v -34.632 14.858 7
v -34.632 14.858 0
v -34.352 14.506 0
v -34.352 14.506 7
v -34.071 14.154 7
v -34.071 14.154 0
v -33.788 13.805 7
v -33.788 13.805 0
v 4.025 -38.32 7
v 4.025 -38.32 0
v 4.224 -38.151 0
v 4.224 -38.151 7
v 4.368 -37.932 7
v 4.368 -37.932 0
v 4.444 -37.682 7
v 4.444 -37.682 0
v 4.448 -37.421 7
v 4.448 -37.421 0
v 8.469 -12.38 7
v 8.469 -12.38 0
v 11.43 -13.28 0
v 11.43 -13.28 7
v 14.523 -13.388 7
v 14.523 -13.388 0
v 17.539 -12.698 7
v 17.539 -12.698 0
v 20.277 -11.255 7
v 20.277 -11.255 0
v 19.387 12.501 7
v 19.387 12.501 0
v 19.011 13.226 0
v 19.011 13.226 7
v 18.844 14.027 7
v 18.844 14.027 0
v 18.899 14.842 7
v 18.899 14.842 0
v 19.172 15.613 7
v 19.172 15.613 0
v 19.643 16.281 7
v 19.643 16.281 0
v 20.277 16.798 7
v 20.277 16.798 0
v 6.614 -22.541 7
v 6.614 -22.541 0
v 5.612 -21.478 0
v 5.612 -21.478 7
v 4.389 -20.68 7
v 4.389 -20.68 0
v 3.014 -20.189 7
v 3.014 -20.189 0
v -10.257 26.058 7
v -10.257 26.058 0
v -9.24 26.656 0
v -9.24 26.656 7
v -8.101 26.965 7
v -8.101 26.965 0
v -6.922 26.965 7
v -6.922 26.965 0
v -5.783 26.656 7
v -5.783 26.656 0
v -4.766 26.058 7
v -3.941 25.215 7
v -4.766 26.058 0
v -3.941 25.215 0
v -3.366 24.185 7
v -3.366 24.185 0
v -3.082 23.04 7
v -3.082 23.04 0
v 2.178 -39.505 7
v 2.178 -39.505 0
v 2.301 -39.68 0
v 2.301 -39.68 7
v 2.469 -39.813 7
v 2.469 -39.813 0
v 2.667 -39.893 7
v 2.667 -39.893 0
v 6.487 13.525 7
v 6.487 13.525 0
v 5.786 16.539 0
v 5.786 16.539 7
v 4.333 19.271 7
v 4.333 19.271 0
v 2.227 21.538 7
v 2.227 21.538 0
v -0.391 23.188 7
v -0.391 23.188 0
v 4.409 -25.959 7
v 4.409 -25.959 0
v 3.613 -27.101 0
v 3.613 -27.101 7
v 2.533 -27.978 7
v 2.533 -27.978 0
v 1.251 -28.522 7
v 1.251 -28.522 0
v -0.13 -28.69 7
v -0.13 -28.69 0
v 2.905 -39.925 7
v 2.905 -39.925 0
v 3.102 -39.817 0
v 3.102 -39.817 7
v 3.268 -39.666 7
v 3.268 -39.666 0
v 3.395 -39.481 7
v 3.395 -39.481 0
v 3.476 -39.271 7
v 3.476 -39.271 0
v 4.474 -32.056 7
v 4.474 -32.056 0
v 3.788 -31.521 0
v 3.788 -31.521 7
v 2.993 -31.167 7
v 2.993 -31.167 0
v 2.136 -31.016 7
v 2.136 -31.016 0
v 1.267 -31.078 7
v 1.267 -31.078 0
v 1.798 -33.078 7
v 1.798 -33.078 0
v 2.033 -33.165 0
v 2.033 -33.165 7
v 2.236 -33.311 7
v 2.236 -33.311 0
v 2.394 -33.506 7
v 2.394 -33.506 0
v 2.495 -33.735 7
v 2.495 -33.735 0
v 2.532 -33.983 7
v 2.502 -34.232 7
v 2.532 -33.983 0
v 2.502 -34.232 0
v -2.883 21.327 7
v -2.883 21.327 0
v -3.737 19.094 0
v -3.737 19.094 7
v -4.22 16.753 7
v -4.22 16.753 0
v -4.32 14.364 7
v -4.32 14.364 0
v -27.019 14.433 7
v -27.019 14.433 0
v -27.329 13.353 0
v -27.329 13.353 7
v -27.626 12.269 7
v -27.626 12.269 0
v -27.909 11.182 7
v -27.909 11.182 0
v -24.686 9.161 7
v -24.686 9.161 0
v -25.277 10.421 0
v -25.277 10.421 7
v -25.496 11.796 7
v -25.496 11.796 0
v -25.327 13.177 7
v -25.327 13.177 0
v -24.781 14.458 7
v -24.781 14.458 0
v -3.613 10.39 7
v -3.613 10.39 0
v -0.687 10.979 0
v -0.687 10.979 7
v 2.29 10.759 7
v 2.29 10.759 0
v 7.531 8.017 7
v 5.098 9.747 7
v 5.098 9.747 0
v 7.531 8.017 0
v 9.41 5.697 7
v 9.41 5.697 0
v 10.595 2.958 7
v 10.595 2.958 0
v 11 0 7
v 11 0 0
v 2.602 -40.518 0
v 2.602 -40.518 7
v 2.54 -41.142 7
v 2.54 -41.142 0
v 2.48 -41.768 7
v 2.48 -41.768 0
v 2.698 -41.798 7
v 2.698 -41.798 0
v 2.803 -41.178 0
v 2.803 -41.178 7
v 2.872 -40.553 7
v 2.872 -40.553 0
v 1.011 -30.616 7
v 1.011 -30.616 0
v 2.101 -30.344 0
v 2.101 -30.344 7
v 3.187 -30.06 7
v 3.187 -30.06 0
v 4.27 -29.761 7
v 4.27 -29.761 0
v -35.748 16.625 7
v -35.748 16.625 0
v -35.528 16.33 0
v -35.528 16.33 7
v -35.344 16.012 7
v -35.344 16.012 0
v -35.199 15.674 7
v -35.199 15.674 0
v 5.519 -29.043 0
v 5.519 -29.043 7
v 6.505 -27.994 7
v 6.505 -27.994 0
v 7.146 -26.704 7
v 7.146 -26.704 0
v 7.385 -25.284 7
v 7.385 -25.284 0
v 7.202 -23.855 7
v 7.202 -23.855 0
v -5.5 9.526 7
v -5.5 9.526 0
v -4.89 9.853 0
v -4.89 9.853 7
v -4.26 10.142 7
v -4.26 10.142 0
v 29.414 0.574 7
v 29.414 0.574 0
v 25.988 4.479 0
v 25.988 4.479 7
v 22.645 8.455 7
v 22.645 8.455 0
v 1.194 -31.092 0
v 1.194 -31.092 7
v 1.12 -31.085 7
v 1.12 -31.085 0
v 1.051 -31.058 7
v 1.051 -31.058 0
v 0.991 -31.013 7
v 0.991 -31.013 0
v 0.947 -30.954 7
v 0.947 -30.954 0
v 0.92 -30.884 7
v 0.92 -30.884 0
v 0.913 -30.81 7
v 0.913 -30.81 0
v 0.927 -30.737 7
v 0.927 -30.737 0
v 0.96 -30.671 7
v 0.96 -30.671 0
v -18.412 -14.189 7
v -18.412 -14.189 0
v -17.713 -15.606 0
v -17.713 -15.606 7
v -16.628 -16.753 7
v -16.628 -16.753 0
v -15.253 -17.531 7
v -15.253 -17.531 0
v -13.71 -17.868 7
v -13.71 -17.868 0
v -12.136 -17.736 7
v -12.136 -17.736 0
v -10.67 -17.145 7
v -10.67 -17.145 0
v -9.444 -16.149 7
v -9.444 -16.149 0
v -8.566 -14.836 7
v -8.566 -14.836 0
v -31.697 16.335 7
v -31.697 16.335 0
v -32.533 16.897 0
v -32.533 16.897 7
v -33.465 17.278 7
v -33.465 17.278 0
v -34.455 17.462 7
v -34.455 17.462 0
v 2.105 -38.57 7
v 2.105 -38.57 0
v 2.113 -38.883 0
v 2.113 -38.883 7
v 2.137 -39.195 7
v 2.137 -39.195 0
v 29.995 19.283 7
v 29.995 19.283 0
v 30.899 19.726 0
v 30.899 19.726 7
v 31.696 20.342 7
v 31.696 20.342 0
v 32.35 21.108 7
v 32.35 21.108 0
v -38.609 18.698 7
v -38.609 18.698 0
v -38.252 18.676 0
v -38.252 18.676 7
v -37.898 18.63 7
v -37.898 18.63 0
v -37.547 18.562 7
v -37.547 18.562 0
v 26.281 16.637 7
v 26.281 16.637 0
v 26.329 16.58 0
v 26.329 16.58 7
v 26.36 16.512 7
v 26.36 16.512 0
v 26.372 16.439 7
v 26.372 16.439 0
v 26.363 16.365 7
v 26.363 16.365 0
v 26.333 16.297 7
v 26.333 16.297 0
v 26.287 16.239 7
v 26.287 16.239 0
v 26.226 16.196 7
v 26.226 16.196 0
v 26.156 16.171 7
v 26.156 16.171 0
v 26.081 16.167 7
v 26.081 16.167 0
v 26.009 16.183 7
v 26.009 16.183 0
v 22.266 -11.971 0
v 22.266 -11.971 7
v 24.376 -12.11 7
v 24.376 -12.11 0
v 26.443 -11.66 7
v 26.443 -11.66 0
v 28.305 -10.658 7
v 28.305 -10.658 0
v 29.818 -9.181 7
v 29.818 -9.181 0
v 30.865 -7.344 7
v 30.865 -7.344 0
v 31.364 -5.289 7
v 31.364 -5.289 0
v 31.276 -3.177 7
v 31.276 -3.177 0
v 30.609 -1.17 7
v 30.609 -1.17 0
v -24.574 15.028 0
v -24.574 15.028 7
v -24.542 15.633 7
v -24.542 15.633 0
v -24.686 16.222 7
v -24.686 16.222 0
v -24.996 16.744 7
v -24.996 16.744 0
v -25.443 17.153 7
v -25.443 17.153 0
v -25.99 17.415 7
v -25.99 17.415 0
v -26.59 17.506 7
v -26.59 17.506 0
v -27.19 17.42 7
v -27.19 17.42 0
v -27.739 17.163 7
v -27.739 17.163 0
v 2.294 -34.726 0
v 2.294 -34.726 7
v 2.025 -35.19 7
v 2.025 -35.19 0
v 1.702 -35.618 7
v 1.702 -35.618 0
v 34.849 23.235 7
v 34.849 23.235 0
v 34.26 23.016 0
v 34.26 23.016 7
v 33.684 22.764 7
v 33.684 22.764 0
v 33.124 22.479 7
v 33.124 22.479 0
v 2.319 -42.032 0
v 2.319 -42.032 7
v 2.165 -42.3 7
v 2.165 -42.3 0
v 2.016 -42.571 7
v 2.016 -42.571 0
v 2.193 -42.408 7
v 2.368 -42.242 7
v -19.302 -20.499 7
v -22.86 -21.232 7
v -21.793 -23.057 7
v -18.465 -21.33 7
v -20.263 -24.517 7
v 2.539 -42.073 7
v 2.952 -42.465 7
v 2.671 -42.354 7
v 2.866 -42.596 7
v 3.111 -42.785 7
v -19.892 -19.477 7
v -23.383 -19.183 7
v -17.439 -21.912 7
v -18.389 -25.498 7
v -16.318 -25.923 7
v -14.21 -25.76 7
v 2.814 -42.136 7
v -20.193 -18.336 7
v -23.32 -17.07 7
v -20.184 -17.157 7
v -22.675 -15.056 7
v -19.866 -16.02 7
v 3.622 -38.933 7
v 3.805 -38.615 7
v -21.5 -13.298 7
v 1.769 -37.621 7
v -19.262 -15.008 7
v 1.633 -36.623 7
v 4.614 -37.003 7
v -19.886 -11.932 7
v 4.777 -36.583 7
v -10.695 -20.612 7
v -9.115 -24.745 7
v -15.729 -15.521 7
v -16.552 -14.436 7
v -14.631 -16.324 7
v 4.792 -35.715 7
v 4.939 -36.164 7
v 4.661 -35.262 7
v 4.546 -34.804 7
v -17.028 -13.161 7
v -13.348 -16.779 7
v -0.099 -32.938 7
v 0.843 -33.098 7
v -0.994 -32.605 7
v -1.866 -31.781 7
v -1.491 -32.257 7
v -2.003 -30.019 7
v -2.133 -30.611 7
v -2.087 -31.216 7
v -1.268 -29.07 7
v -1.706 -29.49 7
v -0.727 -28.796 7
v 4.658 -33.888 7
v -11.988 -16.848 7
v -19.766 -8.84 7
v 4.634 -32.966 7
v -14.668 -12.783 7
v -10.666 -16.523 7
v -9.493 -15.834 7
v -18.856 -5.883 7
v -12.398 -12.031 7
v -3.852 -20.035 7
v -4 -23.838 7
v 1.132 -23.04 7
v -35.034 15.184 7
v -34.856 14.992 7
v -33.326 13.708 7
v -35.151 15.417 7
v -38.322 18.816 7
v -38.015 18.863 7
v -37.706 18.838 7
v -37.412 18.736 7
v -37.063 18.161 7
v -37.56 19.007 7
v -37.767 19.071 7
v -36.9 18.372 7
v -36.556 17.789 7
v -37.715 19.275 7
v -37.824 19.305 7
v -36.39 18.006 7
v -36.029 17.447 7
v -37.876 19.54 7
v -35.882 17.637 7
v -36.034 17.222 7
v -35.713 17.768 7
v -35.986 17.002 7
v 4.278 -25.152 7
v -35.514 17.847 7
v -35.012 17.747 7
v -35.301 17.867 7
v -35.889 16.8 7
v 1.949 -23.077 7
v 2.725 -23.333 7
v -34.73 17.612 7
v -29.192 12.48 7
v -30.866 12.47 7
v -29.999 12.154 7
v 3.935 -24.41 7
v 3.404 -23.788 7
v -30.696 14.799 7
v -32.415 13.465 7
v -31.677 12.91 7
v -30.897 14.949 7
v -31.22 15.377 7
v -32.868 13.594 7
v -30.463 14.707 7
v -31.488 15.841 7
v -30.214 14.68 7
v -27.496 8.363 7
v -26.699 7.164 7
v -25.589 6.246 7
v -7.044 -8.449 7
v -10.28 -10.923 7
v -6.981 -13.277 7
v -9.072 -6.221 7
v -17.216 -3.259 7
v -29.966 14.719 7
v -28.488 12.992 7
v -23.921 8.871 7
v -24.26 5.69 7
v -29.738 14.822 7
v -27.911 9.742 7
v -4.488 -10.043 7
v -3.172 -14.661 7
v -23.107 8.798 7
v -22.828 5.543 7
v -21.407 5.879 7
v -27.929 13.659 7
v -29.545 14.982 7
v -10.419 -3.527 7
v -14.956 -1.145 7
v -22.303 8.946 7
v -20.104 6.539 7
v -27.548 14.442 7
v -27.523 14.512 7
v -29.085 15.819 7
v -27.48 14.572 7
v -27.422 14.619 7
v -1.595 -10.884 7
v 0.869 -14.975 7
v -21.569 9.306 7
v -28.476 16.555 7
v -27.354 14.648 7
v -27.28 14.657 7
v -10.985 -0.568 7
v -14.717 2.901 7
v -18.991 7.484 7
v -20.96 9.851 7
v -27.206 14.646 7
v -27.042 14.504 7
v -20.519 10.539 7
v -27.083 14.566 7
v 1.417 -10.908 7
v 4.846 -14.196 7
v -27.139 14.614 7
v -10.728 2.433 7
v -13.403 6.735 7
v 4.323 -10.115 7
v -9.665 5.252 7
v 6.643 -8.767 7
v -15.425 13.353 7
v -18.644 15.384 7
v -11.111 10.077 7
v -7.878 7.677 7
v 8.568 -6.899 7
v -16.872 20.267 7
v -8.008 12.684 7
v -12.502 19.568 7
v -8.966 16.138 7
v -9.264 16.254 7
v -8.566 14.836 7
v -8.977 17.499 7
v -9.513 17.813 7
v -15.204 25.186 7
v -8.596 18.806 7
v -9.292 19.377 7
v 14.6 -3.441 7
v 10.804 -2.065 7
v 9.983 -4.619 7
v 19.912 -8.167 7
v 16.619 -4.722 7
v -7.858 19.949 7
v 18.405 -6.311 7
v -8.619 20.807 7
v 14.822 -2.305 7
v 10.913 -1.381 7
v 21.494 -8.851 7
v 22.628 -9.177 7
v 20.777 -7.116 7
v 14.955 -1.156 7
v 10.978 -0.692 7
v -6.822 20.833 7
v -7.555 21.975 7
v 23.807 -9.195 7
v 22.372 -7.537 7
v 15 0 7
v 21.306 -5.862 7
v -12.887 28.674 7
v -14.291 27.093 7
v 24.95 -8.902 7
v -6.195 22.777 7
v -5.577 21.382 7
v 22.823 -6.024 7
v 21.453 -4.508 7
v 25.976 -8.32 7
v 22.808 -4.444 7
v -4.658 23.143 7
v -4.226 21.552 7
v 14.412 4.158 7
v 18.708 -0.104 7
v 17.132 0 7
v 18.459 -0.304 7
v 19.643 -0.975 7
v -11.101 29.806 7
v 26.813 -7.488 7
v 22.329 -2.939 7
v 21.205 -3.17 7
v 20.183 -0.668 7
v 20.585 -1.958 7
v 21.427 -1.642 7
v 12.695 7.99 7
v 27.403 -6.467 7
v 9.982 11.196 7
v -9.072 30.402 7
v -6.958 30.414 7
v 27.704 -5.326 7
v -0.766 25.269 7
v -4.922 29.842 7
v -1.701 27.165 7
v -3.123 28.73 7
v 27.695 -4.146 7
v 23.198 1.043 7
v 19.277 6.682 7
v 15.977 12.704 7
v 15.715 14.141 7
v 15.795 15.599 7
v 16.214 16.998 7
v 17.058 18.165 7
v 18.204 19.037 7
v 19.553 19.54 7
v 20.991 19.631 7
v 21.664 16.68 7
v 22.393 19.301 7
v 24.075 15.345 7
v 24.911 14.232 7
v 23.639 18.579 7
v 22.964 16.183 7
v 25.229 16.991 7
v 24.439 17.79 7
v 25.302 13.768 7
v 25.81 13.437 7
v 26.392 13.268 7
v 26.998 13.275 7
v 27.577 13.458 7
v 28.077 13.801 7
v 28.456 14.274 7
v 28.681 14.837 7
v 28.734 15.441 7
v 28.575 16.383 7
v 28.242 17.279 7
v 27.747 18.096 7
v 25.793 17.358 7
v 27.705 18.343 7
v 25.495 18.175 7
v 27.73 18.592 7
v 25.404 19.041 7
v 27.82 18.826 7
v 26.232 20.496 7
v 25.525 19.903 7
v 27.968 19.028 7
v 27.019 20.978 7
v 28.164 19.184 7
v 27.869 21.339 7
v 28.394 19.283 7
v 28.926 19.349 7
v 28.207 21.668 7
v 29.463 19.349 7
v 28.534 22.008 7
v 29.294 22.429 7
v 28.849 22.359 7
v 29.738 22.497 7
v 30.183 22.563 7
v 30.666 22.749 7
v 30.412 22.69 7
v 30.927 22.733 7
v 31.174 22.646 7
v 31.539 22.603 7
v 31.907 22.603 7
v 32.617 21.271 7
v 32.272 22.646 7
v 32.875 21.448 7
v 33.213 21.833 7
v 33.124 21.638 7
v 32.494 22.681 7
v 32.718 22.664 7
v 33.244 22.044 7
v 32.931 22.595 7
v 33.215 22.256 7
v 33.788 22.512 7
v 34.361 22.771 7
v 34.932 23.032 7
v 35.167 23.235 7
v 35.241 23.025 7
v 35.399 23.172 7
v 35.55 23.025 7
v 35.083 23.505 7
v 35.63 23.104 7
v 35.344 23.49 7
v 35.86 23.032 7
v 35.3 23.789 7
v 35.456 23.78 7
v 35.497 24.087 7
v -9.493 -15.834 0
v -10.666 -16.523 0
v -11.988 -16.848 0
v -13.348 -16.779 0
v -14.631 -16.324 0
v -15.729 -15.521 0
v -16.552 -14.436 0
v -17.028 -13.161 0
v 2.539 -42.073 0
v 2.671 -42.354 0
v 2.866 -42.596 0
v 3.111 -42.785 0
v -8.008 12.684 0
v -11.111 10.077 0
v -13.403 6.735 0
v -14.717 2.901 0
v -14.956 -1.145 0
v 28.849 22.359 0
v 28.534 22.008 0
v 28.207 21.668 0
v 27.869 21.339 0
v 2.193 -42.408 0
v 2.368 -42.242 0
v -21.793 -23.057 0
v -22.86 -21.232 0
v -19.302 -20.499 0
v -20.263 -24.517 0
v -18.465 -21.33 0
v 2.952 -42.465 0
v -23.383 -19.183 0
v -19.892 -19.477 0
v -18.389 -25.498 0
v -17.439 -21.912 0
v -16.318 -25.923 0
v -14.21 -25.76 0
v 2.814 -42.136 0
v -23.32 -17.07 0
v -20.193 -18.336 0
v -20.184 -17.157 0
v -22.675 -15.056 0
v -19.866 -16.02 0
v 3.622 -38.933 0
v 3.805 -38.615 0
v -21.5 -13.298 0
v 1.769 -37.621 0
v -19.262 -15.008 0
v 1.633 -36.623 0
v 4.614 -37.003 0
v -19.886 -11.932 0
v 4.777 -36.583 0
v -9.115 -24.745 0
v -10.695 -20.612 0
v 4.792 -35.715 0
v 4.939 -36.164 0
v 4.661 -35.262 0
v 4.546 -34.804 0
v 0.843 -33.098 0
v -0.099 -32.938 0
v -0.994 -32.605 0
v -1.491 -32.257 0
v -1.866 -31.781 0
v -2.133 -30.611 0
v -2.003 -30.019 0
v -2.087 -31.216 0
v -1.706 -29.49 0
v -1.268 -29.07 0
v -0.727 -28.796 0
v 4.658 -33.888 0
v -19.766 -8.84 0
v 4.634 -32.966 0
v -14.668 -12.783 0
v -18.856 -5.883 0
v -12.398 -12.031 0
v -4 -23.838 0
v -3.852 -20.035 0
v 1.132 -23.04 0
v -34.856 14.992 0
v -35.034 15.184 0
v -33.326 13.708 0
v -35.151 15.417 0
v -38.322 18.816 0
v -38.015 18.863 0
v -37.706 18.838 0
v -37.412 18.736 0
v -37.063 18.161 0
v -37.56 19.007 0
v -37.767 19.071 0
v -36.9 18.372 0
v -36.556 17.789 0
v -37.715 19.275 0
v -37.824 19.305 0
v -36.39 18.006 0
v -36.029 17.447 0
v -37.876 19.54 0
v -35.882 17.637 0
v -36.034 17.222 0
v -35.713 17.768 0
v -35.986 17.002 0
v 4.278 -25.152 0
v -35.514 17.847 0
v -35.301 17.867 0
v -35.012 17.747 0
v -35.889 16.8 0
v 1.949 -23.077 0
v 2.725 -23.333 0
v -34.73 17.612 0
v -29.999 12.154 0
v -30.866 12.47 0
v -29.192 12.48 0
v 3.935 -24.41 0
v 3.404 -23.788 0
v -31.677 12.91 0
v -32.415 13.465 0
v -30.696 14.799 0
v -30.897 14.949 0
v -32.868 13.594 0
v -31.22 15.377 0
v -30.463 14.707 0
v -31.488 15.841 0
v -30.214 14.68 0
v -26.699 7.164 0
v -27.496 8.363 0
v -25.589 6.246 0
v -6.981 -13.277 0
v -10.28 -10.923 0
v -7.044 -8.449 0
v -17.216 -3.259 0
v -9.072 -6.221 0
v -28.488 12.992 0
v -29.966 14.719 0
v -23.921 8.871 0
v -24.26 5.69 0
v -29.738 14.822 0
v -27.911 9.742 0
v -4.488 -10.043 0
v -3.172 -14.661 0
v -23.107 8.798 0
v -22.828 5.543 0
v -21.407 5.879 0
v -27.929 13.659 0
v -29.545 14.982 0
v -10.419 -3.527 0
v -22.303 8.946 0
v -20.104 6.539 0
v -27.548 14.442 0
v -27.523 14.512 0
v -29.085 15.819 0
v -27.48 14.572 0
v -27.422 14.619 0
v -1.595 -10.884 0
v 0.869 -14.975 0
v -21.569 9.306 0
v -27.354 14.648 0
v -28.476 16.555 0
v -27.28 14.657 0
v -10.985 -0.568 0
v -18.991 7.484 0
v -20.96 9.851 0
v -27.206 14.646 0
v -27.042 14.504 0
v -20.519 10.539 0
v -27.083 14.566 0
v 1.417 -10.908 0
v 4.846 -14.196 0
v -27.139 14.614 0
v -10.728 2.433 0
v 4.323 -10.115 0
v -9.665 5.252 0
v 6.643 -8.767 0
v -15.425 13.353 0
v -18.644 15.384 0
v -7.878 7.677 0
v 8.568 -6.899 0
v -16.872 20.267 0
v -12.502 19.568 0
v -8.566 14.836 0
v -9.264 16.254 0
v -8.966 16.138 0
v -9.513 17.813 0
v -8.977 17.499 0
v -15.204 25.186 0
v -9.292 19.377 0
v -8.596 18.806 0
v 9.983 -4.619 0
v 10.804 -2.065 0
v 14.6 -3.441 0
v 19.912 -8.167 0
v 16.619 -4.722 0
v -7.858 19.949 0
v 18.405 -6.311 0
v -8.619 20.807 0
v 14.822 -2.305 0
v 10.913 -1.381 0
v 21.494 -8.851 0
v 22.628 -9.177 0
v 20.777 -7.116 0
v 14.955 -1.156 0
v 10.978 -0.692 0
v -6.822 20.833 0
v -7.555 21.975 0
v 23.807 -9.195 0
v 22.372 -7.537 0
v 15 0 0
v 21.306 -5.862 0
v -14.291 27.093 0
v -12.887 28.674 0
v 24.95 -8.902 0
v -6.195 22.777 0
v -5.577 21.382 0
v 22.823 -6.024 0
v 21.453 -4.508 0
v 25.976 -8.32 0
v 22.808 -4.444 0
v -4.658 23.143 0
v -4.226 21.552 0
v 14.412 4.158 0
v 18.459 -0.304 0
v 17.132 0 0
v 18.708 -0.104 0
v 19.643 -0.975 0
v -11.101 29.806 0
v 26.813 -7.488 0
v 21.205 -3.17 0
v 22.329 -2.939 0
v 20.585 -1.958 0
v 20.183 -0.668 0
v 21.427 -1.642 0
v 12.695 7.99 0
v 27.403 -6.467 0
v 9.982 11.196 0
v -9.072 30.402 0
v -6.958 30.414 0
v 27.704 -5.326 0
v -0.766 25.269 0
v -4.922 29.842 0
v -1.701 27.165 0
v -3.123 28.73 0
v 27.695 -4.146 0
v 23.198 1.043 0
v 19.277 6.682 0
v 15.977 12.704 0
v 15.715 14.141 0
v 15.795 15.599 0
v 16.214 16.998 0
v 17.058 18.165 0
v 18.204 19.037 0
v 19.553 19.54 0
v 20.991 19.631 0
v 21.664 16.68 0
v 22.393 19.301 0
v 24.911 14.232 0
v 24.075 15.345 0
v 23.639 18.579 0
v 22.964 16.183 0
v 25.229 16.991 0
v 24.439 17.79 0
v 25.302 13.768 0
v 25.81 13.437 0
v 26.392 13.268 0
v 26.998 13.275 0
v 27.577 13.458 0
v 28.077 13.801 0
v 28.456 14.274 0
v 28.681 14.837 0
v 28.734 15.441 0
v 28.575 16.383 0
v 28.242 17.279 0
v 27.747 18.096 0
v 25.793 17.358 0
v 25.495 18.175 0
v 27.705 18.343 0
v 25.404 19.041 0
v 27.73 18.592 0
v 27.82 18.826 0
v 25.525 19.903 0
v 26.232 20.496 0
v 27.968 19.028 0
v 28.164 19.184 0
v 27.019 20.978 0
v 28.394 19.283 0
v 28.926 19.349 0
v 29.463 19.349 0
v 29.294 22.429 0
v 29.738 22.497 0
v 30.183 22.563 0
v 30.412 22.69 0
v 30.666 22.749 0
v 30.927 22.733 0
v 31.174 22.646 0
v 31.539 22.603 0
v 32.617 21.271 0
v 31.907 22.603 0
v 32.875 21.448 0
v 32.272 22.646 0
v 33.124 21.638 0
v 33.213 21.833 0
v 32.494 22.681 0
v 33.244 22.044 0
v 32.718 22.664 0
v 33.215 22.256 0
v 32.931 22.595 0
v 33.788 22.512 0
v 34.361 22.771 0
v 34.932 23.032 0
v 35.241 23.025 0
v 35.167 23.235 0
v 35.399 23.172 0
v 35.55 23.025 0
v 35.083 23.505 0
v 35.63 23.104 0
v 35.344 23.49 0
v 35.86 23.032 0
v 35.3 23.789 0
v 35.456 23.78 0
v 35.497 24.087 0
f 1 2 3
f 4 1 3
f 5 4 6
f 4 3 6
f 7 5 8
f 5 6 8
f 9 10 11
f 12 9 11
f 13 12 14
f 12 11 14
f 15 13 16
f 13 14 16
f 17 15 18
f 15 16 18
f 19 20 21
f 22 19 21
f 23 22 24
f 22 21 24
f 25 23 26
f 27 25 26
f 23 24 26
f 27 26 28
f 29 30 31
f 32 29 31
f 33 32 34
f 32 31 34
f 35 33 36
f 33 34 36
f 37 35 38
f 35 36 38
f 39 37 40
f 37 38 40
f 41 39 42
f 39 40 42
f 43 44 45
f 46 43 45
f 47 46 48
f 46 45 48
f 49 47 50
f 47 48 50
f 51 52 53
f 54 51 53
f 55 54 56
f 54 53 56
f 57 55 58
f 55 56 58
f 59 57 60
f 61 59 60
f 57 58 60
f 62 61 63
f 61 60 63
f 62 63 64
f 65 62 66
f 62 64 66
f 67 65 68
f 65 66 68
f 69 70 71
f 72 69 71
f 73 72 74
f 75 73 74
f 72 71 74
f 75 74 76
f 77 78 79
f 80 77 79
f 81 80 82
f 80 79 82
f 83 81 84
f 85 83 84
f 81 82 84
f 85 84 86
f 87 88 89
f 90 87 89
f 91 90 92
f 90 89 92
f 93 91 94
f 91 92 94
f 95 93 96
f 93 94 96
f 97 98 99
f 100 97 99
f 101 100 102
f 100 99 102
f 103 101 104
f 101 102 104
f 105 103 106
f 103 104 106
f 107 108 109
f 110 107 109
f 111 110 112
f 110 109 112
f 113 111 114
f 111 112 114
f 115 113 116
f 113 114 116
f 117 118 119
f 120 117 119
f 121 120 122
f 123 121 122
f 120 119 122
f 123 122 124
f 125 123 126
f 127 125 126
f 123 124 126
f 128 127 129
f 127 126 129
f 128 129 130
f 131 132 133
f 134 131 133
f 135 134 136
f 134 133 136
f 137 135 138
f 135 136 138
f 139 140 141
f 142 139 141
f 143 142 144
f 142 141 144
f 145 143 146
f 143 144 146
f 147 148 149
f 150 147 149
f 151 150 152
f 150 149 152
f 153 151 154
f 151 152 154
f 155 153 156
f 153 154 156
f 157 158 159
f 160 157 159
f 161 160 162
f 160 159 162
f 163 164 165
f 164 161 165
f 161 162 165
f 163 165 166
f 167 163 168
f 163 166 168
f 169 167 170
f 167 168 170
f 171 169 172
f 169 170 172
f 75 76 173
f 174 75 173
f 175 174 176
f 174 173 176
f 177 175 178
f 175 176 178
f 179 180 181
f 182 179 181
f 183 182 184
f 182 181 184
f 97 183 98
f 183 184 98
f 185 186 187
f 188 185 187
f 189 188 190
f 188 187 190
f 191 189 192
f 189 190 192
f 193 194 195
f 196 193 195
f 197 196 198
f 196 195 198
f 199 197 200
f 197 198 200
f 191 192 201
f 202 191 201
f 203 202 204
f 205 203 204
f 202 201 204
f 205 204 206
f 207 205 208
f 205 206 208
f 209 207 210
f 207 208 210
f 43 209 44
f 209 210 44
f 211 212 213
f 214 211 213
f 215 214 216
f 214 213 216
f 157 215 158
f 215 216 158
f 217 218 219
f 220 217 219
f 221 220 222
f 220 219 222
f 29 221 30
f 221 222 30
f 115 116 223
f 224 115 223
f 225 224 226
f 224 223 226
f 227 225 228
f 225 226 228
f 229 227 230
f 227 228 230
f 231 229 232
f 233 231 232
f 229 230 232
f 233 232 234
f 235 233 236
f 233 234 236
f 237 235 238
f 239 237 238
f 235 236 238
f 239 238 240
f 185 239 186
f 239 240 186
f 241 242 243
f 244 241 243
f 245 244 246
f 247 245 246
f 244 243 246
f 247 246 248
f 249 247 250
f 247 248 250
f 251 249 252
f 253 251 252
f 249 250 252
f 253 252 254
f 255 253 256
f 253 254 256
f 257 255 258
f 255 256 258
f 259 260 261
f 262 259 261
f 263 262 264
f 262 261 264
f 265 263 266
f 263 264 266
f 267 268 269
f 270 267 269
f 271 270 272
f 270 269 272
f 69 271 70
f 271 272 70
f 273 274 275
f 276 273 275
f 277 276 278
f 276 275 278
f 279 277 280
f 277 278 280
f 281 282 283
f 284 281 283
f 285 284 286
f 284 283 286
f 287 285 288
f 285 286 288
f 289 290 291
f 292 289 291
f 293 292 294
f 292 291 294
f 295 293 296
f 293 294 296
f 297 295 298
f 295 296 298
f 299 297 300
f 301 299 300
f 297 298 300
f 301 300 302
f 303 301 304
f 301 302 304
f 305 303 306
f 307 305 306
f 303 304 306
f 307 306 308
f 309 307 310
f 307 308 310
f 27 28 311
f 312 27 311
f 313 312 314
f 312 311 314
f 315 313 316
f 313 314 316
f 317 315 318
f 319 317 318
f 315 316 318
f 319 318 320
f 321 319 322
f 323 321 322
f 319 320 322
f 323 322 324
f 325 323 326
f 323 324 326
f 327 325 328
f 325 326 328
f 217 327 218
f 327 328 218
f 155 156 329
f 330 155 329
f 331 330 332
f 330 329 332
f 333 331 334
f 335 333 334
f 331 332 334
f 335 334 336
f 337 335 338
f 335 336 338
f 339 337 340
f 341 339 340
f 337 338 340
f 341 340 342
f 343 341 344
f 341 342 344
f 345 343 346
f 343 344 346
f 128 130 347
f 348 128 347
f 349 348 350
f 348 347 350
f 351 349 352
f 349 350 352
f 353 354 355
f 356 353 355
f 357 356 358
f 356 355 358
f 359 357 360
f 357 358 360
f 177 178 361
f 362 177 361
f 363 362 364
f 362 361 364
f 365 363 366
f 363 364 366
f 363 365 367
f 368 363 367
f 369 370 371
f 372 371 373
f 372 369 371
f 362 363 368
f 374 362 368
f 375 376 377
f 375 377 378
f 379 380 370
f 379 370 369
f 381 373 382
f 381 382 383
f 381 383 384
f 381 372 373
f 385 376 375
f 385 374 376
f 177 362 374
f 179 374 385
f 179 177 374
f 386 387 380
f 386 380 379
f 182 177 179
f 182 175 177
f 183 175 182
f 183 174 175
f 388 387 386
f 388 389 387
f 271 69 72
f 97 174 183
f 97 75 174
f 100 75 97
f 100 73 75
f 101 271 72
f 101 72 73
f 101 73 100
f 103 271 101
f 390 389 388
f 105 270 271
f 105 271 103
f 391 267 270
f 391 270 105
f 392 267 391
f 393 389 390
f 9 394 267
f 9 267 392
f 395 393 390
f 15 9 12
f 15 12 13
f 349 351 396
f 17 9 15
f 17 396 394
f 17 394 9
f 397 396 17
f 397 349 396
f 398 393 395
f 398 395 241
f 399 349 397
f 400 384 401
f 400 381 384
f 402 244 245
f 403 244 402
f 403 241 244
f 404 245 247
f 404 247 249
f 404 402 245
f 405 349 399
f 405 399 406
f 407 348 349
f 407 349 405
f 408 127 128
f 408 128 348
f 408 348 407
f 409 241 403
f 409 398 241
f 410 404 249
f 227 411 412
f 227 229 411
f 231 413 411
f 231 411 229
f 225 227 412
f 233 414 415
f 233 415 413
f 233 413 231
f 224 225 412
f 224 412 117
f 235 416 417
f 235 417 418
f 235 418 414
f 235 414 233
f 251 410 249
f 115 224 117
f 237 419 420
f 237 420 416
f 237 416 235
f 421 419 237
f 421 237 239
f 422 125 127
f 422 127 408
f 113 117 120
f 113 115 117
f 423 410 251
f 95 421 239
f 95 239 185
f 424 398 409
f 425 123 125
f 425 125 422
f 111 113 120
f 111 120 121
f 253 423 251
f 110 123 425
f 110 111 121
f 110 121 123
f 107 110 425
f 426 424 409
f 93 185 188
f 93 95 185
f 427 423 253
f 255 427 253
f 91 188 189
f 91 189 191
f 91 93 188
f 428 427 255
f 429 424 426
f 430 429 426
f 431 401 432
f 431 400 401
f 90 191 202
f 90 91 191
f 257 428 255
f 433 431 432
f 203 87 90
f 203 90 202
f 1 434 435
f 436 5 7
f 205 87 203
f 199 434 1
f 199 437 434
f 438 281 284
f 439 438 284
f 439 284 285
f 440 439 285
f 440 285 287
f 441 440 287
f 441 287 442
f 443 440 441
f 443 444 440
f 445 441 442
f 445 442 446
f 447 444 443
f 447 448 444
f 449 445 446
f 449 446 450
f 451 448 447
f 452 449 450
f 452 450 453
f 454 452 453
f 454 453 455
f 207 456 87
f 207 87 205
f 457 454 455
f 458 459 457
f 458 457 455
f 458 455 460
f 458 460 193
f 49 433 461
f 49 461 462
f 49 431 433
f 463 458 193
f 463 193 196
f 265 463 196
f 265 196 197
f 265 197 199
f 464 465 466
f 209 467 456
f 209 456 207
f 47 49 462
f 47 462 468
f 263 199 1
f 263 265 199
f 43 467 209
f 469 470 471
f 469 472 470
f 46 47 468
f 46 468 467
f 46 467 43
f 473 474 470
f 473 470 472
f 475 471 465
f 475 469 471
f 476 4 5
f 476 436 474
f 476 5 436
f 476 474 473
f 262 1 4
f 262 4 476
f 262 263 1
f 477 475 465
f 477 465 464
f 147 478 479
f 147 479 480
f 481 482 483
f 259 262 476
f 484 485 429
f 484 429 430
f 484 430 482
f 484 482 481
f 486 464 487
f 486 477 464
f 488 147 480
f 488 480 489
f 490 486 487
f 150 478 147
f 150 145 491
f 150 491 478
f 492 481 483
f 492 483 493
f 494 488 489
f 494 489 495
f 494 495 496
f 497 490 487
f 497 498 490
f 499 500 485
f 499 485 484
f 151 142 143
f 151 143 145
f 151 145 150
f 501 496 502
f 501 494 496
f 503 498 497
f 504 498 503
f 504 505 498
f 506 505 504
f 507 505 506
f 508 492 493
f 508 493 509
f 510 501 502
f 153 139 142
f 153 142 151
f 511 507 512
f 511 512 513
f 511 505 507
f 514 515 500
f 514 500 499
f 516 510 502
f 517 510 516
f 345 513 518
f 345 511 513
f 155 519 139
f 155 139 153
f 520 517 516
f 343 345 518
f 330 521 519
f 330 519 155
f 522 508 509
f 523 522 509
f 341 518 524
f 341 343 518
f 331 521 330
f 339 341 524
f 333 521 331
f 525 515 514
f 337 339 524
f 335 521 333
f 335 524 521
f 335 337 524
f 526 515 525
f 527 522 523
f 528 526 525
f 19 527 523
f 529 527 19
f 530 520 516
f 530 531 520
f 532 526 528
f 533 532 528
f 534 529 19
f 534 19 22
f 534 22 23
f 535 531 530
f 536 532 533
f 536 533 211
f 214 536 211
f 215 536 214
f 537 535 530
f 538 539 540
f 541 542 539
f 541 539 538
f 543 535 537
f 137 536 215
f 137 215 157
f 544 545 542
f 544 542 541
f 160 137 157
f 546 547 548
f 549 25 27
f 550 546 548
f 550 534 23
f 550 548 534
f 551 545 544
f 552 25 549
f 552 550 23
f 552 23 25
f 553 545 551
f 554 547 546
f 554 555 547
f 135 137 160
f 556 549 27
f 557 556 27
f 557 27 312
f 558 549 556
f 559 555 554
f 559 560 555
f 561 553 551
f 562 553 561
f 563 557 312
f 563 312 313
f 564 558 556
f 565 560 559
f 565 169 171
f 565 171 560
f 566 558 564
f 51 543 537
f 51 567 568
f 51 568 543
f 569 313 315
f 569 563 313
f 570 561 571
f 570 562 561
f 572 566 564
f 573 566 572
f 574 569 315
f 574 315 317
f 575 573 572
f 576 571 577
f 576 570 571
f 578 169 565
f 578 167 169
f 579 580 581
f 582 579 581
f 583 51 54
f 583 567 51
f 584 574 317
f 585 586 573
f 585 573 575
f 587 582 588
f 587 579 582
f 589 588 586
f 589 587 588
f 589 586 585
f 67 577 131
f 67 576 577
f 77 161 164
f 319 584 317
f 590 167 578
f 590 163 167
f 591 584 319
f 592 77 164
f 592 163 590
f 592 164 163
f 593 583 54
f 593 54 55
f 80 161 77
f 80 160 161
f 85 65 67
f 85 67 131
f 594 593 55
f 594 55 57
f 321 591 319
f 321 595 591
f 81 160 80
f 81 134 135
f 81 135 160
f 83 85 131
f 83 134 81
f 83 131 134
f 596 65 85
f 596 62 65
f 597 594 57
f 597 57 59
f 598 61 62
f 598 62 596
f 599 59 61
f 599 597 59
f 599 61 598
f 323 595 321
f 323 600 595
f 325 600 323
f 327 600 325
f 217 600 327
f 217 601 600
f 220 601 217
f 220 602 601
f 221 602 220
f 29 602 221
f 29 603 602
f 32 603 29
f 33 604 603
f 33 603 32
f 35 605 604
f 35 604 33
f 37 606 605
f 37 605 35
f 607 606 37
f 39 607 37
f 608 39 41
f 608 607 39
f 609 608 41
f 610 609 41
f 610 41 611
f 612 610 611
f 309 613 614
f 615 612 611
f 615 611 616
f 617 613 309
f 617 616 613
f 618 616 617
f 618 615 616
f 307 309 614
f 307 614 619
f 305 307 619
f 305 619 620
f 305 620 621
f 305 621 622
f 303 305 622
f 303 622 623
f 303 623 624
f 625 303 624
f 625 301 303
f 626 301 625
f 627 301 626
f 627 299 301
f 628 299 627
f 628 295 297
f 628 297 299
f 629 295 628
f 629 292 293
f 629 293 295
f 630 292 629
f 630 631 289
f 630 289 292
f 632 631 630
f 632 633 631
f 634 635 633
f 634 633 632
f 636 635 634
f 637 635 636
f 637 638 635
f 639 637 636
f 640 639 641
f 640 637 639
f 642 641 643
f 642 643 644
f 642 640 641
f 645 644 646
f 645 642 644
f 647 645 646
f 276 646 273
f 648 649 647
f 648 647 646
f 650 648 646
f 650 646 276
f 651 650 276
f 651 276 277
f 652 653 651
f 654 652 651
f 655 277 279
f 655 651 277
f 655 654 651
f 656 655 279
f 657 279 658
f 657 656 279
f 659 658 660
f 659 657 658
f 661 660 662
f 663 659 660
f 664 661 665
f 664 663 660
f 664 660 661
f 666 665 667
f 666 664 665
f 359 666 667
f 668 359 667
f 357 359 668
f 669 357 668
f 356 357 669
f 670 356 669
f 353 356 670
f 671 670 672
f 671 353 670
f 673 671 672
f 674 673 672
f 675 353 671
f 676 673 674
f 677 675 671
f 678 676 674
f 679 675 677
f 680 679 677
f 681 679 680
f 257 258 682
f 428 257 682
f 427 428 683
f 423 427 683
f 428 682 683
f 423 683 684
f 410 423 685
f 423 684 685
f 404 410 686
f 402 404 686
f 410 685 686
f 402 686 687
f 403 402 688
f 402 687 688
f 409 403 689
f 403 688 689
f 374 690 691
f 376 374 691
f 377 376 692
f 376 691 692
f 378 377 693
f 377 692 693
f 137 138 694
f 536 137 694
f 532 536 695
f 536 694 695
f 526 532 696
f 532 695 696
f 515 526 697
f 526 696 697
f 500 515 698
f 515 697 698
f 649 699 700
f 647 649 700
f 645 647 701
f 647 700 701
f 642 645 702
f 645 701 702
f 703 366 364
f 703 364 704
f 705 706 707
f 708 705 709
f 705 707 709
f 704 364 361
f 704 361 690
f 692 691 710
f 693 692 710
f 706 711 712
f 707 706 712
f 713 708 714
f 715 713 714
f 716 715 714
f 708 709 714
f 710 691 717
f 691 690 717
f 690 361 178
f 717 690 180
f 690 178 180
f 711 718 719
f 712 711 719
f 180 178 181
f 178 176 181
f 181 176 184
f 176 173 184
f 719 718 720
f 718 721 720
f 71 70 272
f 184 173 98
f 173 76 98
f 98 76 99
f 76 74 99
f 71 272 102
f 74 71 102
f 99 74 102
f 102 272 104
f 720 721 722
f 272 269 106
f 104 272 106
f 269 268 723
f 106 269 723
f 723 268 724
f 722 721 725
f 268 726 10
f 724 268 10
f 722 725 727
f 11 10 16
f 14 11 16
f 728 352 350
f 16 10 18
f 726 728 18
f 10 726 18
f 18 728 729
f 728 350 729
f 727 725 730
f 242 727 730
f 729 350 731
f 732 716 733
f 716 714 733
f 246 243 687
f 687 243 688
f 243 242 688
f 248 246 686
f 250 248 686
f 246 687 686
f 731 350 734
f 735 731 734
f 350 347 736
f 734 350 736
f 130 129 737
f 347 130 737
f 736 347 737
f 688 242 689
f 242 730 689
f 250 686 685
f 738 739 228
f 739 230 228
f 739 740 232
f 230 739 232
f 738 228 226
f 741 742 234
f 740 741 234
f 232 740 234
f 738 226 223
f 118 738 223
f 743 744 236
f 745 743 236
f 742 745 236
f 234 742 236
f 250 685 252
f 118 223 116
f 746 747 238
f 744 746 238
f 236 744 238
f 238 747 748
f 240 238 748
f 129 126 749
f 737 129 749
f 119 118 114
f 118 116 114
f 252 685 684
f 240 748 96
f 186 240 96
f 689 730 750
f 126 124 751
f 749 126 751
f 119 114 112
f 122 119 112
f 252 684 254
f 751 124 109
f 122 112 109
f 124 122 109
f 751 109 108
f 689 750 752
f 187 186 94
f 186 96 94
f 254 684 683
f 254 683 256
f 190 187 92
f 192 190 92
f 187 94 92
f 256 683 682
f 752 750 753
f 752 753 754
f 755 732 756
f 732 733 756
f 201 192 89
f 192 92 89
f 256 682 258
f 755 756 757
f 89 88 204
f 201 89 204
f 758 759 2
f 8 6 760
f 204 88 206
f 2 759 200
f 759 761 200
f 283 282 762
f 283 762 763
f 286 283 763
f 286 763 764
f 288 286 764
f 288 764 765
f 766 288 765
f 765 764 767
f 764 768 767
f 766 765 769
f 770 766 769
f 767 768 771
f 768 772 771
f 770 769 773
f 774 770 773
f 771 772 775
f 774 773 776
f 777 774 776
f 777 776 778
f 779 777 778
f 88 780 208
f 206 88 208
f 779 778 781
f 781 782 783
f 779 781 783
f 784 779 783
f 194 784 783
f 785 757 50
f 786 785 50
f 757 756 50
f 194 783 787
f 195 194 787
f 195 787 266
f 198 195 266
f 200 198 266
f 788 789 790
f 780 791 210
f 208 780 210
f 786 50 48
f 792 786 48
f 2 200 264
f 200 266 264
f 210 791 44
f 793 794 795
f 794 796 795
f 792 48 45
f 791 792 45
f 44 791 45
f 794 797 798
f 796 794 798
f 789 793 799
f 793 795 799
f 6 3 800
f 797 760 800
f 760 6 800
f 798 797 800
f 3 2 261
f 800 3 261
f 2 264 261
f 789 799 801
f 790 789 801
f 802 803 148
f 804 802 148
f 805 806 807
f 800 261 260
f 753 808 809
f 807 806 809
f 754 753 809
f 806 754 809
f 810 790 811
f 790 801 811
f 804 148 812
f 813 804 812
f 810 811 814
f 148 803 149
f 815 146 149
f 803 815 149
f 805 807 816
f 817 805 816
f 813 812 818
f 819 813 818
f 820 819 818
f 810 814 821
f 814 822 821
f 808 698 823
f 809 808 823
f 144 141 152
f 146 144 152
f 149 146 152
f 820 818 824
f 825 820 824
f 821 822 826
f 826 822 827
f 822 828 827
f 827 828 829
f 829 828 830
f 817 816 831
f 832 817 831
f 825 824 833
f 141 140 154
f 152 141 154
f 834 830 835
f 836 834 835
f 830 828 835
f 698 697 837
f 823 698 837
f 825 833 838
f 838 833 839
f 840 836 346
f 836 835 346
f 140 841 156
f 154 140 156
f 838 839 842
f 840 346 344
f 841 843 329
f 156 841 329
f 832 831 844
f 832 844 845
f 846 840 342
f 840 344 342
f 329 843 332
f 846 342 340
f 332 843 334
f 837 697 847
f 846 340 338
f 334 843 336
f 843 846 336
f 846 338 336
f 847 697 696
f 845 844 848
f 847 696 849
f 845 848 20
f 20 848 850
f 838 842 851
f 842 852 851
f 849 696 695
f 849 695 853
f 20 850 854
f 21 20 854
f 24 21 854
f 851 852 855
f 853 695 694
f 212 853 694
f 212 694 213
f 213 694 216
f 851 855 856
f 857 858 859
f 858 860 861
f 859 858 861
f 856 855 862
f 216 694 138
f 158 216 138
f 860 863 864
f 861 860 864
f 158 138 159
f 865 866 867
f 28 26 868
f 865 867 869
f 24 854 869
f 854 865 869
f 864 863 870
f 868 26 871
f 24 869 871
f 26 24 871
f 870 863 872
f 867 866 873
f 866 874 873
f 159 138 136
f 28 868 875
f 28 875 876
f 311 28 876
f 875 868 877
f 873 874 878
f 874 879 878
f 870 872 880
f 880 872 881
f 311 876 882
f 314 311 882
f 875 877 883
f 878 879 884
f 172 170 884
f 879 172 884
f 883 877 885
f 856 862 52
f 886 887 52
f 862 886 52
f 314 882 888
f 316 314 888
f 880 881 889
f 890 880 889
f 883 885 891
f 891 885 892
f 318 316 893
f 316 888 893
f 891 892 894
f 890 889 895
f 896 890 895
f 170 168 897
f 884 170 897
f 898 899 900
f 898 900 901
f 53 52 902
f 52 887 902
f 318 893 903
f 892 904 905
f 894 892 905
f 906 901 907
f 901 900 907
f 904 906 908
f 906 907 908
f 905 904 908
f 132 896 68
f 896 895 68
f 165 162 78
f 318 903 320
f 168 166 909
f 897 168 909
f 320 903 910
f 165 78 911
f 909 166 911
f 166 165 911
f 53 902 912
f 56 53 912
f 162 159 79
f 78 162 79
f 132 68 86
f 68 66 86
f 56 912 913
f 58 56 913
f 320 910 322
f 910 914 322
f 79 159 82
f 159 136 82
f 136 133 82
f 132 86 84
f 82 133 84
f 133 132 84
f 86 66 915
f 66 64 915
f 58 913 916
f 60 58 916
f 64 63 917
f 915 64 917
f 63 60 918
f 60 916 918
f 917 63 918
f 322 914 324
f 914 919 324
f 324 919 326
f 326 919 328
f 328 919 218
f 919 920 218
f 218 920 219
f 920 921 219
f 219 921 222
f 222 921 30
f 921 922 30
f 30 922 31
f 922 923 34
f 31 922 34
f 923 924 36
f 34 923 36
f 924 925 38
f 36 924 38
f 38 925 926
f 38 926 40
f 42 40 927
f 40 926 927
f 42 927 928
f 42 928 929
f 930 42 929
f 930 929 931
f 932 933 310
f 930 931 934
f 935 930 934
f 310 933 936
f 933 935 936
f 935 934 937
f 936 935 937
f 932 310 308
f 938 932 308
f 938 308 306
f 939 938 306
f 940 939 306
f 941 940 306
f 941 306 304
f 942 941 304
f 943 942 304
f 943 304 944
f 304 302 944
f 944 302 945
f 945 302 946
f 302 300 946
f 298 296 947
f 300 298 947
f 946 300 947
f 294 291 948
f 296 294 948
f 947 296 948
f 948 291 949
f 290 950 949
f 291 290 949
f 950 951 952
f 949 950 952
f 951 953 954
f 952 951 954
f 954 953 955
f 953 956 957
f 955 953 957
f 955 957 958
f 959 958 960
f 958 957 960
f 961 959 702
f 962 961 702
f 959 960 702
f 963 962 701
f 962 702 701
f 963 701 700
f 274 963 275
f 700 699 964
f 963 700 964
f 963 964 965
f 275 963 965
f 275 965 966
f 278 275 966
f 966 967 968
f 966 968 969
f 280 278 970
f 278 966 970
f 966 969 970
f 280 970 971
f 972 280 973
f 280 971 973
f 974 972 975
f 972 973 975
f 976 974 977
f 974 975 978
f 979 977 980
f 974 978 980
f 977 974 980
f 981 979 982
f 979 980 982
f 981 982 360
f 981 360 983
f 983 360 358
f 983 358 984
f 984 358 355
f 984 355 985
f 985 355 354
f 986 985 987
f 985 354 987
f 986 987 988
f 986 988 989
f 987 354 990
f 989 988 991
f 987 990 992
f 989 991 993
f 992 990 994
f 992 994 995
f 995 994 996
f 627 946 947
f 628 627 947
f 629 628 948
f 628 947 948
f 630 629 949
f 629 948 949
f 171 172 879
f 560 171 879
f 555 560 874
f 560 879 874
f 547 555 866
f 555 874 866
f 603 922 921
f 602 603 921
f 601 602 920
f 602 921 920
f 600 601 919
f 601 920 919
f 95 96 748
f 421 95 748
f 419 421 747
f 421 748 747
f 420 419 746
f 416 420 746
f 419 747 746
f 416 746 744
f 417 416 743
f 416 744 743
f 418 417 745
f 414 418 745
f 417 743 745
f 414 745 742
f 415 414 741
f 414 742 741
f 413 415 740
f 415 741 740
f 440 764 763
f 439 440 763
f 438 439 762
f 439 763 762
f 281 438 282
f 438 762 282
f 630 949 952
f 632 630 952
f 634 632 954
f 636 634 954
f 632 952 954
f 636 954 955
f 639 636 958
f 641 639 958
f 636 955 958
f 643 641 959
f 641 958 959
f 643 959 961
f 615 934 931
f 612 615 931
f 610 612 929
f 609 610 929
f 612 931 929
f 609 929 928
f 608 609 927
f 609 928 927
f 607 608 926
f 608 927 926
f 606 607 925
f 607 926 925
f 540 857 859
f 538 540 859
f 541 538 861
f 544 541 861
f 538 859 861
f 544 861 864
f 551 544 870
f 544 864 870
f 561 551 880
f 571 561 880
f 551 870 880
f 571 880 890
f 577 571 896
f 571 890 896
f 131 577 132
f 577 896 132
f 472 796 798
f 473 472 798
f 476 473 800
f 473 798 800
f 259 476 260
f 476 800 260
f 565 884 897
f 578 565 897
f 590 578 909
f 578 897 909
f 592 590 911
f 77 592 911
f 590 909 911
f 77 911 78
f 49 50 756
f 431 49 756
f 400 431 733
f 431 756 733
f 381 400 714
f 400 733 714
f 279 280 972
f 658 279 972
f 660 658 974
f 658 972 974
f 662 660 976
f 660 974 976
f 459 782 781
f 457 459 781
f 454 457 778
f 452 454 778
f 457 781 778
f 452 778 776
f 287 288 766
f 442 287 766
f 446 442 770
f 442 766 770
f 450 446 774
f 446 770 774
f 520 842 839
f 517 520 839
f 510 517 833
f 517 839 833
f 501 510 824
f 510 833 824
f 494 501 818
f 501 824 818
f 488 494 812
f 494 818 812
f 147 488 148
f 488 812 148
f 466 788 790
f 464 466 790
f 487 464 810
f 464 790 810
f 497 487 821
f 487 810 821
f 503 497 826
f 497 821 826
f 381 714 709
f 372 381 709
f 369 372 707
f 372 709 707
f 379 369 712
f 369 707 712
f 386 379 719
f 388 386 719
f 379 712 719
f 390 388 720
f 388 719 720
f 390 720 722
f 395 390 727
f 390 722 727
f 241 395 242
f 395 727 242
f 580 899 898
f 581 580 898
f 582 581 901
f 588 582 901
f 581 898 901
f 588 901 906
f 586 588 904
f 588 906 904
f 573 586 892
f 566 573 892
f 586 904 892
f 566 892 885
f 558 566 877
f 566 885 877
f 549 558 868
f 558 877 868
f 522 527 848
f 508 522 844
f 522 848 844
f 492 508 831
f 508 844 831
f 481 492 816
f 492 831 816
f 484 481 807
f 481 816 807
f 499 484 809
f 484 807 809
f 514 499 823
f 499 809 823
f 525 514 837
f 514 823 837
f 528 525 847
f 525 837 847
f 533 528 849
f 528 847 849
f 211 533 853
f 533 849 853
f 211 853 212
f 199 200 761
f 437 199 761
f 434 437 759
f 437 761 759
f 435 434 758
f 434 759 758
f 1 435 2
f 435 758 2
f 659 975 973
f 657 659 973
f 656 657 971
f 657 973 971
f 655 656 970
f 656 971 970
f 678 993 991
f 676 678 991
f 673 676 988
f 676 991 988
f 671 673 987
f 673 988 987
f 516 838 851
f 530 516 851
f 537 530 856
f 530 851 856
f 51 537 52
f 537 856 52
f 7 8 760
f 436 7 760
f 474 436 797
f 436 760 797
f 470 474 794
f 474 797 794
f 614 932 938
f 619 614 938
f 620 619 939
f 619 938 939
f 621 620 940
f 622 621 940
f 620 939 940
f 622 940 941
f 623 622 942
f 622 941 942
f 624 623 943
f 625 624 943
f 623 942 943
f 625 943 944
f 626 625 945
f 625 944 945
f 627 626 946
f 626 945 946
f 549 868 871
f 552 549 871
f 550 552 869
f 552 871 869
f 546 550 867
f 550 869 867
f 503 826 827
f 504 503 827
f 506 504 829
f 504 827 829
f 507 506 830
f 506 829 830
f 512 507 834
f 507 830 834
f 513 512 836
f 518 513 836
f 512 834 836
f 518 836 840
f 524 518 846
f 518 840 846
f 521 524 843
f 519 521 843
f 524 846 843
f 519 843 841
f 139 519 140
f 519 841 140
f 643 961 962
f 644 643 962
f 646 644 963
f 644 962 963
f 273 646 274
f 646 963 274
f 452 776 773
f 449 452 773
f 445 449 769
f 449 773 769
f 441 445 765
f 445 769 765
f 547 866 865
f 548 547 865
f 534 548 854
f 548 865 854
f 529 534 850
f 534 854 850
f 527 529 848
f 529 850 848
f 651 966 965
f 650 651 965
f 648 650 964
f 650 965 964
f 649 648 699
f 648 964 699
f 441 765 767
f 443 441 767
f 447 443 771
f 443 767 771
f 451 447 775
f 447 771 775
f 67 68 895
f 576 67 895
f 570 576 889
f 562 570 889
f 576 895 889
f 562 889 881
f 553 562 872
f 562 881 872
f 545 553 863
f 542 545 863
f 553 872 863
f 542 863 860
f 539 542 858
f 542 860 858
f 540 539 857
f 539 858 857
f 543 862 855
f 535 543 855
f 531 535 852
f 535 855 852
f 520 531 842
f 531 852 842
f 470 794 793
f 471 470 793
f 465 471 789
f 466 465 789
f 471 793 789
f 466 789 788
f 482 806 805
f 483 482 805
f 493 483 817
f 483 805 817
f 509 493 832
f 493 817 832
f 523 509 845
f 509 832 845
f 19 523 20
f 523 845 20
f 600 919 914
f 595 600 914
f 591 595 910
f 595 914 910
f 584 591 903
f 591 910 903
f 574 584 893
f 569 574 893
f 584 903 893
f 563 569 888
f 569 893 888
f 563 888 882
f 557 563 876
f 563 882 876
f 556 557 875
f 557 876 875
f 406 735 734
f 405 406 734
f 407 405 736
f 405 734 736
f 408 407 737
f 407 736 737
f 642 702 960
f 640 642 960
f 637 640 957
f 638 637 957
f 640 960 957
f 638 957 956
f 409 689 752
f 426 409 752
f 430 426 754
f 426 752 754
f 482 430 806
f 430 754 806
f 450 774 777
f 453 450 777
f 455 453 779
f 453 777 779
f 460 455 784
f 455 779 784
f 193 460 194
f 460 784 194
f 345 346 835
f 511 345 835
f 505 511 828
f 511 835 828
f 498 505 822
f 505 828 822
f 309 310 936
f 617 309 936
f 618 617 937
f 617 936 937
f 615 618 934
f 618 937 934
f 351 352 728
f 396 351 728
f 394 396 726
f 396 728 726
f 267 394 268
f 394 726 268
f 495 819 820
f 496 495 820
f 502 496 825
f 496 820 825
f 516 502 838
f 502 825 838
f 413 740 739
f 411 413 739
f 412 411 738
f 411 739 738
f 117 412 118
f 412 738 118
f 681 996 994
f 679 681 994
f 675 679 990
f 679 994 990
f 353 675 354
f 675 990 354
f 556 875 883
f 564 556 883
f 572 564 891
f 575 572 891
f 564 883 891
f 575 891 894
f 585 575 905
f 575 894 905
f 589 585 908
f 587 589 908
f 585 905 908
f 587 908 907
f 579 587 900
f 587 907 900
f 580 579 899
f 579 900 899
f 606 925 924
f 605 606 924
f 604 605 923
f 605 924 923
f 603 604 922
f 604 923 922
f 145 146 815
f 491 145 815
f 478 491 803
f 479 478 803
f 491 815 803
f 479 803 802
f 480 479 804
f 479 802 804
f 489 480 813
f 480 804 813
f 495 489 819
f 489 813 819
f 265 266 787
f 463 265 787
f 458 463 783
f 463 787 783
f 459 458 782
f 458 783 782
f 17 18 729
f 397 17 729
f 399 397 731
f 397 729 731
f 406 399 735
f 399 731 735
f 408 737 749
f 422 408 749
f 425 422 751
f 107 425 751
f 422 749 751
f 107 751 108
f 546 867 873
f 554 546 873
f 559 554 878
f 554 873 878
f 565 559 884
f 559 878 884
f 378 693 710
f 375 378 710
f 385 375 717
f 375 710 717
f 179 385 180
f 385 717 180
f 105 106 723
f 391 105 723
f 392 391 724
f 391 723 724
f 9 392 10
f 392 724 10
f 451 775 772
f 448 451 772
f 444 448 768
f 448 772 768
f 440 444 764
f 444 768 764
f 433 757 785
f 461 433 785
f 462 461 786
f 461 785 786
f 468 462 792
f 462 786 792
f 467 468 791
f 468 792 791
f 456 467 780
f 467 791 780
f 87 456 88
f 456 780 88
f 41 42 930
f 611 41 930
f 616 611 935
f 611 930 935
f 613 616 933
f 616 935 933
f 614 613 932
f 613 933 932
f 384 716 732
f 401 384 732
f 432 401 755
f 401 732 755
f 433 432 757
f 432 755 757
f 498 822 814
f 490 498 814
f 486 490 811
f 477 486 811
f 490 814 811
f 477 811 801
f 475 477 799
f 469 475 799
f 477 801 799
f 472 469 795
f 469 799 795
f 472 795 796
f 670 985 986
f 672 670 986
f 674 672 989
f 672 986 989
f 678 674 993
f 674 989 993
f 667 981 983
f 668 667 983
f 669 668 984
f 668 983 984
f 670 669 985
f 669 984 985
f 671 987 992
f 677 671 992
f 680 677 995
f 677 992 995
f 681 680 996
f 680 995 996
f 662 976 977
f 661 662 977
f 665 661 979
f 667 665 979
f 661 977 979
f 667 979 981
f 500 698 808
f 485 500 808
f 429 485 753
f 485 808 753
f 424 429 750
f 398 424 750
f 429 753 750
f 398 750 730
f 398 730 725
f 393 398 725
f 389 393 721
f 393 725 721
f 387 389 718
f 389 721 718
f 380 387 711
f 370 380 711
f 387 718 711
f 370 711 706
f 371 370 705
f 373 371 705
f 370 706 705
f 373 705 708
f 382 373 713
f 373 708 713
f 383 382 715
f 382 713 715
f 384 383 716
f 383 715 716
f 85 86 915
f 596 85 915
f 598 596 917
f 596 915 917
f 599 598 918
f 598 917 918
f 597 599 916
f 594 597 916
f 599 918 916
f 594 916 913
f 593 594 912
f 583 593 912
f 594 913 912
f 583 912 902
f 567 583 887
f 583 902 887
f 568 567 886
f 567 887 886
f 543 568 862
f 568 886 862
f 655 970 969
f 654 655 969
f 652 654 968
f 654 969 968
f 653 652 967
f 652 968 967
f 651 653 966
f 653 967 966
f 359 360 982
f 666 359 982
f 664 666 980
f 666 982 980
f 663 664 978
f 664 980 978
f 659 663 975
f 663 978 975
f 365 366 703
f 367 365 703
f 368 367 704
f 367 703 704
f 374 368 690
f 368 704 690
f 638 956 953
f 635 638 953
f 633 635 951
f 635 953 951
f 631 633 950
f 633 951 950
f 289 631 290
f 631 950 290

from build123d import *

# Parameters (mm, degrees)
F1_DEPTH = 7
F2_COUNT = 3


with BuildPart() as f1:
    # F0 (on Top) → F1 (new body)
    with BuildSketch(Plane.XY):
        with BuildLine():
            ThreePointArc((19.911619, -8.166607), (17.543738, -5.480184), (14.599963, -3.441086))
            ThreePointArc((14.599963, -3.441086), (12.370328, -8.483807), (8.469307, -12.38026))
            ThreePointArc((8.469307, -12.38026), (14.522507, -13.388086), (20.276548, -11.255493))
            ThreePointArc((20.276548, -11.255493), (29.817845, -9.18146), (29.413784, 0.574292))
            ThreePointArc((29.413784, 0.574292), (24.305689, 6.457834), (19.386908, 12.500541))
            ThreePointArc((19.386908, 12.500541), (18.899382, 14.842139), (20.276548, 16.79769))
            ThreePointArc((20.276548, 16.79769), (22.963658, 16.182674), (24.911437, 14.232043))
            ThreePointArc((24.911437, 14.232043), (27.294309, 13.34521), (28.733607, 15.441152))
            ThreePointArc((28.733607, 15.441152), (28.42968, 16.838907), (27.747044, 18.095927))
            ThreePointArc((27.747044, 18.095927), (27.819997, 18.82609), (28.394395, 19.282736))
            ThreePointArc((28.394395, 19.282736), (29.194592, 19.357364), (29.99479, 19.282736))
            ThreePointArc((29.99479, 19.282736), (31.313352, 20.013671), (32.350428, 21.107905))
            ThreePointArc((32.350428, 21.107905), (32.747453, 21.35798), (33.123679, 21.638373))
            ThreePointArc((33.123679, 21.638373), (33.236351, 21.937357), (33.215091, 22.256158))
            ThreePointArc((33.215091, 22.256158), (34.074746, 22.640916), (34.931641, 23.031782))
            ThreePointArc((34.931641, 23.031782), (35.395743, 23.023665), (35.859846, 23.031782))
            ThreePointArc((35.859846, 23.031782), (35.514758, 23.138271), (35.166871, 23.235226))
            ThreePointArc((35.166871, 23.235226), (35.408402, 23.631601), (35.497464, 24.087142))
            ThreePointArc((35.497464, 24.087142), (35.193756, 23.645558), (34.848992, 23.235226))
            ThreePointArc((34.848992, 23.235226), (33.969899, 22.894434), (33.123679, 22.478674))
            ThreePointArc((33.123679, 22.478674), (32.717605, 22.663576), (32.271761, 22.646023))
            ThreePointArc((32.271761, 22.646023), (31.722721, 22.59774), (31.17368, 22.646023))
            ThreePointArc((31.17368, 22.646023), (30.666364, 22.748602), (30.183258, 22.562858))
            ThreePointArc((30.183258, 22.562858), (29.515854, 22.463255), (28.849158, 22.359021))
            ThreePointArc((28.849158, 22.359021), (28.37224, 21.836259), (27.868547, 21.339245))
            ThreePointArc((27.868547, 21.339245), (26.616866, 20.751209), (25.524797, 19.902753))
            ThreePointArc((25.524797, 19.902753), (25.494877, 18.175258), (26.280845, 16.636625))
            ThreePointArc((26.280845, 16.636625), (26.333424, 16.296609), (26.008667, 16.182994))
            ThreePointArc((26.008667, 16.182994), (24.834884, 17.392019), (23.638841, 18.579029))
            ThreePointArc((23.638841, 18.579029), (19.553333, 19.540115), (16.213791, 16.997965))
            ThreePointArc((16.213791, 16.997965), (15.711707, 14.872374), (15.976911, 12.70445))
            ThreePointArc((15.976911, 12.70445), (21.162192, 3.810315), (27.695496, -4.146362))
            ThreePointArc((27.695496, -4.146362), (25.976142, -8.319526), (21.494055, -8.850903))
            ThreePointArc((21.494055, -8.850903), (22.328872, -2.938933), (17.131662, 0))
            ThreePointArc((17.131662, 0), (21.205283, -3.169777), (19.911619, -8.166607))
        make_face()
        with BuildLine():
            ThreePointArc((4.323353, -10.114772), (-9.180329, 6.059832), (11, 0))
            ThreePointArc((11, 0), (10.95098, -1.037323), (10.804357, -2.0654))
            ThreePointArc((10.804357, -2.0654), (12.749286, -2.62322), (14.599963, -3.441086))
            ThreePointArc((14.599963, -3.441086), (14.899655, -1.73213), (15, 0))
            ThreePointArc((15, 0), (-13.267245, 6.998586), (8.469307, -12.38026))
            ThreePointArc((8.469307, -12.38026), (8.380036, -12.339422), (8.291104, -12.29785))
            ThreePointArc((8.291104, -12.29785), (6.23471, -11.338114), (4.323353, -10.114772))
        make_face()
    extrude(amount=F1_DEPTH)

    # F2: F1 ×3 about axis
    f2_axis = Axis((0, 0, 0), (0, 0, -1))


with BuildPart() as f1_1:
    add(f1.part)
    for i in range(1, F2_COUNT):
        add(f1.part.rotate(f2_axis, i * 360 / F2_COUNT))


solid = f1_1.part
